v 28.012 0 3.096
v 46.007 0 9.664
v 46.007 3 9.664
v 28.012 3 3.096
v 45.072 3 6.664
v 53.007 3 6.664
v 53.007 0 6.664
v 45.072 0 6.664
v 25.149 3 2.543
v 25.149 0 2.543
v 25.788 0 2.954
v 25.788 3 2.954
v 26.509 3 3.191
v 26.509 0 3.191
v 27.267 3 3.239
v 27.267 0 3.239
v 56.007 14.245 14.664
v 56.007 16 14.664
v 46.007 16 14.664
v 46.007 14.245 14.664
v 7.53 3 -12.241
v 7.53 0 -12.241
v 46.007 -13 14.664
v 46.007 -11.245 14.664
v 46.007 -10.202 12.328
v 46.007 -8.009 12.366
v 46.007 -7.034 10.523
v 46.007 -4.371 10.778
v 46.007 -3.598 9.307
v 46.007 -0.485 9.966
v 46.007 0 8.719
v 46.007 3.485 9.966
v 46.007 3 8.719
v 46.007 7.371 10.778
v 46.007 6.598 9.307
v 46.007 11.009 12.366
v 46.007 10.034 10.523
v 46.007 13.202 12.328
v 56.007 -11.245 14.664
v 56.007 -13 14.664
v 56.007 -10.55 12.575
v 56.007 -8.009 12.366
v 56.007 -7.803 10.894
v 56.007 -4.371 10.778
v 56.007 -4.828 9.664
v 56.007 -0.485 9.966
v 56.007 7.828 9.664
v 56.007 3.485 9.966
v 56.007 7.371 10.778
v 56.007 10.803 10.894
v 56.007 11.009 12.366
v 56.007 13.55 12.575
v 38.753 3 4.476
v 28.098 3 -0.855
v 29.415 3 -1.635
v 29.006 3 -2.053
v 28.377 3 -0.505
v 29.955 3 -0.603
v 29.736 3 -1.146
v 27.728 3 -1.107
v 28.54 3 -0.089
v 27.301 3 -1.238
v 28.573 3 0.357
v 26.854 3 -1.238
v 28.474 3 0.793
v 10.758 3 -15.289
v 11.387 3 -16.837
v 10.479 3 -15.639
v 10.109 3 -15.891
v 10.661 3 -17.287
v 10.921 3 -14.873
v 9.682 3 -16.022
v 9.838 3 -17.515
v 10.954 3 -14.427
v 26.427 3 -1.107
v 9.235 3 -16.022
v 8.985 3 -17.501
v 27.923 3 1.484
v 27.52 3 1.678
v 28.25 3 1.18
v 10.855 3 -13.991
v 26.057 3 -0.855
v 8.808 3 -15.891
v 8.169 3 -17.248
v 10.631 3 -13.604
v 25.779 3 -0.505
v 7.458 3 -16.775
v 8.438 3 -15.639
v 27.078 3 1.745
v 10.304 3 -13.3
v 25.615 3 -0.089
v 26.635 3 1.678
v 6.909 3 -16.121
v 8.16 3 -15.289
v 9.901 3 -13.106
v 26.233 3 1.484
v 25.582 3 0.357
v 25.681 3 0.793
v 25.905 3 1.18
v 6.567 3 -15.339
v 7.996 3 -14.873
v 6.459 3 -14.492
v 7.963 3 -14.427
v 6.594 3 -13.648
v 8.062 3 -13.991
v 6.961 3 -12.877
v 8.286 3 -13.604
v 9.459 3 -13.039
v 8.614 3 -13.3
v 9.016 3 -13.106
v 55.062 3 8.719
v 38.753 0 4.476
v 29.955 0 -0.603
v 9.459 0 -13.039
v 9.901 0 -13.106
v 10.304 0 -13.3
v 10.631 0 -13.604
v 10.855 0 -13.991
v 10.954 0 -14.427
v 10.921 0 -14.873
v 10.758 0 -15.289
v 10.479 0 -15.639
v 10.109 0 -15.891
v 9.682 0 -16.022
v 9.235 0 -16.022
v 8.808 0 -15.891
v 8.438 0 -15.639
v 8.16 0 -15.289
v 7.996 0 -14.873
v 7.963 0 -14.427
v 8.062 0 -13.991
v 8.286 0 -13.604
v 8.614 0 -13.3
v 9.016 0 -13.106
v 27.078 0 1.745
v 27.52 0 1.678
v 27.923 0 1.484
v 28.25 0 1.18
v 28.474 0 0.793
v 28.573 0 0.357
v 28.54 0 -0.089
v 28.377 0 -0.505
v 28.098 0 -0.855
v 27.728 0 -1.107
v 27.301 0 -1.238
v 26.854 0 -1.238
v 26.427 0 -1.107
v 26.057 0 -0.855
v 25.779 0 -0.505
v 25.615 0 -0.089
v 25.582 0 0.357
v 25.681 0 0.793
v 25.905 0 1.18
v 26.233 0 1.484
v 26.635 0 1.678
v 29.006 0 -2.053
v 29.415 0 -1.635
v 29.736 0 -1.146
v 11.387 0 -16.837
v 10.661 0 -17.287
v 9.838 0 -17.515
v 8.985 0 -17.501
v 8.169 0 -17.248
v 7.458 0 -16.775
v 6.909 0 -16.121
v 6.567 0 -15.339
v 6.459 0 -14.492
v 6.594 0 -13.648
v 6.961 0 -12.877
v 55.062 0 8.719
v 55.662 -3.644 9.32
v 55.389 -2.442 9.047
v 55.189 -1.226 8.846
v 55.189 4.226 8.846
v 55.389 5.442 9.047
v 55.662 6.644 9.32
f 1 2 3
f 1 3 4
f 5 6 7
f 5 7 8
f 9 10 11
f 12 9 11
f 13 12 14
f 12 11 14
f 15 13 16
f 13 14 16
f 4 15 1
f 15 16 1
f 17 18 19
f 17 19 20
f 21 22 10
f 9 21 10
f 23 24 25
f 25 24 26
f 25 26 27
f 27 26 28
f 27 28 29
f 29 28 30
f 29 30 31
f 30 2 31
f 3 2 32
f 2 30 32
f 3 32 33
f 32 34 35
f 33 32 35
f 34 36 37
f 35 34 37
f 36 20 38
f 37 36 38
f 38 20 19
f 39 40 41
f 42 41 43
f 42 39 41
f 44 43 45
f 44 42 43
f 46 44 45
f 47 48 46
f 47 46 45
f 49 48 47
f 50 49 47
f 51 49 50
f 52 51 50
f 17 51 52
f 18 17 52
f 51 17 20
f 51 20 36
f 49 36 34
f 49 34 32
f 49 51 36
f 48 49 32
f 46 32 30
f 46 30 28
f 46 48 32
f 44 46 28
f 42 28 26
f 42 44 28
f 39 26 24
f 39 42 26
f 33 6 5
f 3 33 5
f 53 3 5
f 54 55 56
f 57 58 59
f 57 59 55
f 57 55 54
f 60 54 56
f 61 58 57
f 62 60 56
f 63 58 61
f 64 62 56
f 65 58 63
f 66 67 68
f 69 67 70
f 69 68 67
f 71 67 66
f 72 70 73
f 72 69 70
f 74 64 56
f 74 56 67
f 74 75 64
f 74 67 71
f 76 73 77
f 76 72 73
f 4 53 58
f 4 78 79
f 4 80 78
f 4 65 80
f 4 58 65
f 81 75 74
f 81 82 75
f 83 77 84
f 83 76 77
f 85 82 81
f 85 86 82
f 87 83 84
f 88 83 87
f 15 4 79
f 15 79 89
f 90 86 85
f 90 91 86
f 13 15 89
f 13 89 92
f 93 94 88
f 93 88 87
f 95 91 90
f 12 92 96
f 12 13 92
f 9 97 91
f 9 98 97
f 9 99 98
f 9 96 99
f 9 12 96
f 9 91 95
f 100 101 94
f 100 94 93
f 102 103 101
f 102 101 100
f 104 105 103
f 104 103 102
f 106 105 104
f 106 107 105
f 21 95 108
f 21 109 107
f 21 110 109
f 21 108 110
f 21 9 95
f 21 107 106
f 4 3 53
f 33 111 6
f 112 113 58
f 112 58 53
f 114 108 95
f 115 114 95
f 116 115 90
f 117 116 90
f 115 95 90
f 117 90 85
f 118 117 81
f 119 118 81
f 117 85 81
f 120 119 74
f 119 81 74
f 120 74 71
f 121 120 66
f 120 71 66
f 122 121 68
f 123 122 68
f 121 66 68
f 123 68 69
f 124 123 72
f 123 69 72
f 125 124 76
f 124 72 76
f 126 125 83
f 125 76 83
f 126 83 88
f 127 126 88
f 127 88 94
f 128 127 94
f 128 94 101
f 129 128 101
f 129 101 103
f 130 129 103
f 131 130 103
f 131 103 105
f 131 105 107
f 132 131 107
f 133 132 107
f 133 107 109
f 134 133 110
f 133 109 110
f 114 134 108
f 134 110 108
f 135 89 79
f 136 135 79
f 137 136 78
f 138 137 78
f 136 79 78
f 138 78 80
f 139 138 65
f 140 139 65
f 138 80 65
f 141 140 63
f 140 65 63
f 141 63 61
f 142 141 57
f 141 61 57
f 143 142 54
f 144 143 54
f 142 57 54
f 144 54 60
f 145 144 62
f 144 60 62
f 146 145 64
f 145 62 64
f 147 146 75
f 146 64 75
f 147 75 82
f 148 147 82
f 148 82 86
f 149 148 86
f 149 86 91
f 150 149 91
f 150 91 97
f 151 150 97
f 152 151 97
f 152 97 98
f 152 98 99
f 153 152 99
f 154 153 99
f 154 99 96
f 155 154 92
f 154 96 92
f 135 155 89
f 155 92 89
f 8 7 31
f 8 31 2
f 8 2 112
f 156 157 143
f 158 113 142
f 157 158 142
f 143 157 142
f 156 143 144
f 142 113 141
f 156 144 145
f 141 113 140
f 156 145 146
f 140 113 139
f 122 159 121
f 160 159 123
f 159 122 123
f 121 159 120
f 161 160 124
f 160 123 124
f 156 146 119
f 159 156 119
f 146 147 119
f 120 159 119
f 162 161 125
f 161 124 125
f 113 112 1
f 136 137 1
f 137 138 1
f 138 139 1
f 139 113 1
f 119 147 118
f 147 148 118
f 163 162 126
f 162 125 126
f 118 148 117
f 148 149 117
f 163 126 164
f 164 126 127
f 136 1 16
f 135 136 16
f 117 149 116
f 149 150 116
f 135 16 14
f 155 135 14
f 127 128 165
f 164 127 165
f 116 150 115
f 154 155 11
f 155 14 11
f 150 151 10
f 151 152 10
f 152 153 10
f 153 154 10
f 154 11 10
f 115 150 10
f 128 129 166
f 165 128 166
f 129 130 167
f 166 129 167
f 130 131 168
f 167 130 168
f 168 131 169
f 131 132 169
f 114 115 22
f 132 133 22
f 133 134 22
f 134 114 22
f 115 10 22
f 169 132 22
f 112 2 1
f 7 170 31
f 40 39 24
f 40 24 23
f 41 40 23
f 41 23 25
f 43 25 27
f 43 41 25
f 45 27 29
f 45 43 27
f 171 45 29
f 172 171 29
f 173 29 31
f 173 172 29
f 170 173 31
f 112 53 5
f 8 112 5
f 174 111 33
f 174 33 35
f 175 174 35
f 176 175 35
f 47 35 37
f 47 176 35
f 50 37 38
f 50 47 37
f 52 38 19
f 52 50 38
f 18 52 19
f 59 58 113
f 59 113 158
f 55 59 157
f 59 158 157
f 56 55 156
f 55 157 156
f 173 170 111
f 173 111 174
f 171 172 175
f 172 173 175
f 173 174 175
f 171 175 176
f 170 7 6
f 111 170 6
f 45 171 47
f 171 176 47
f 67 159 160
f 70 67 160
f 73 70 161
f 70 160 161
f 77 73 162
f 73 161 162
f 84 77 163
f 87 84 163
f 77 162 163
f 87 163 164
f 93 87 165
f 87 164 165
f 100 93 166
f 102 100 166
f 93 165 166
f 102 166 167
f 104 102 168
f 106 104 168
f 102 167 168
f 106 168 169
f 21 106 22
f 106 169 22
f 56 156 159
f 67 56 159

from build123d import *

# Parameters (mm, degrees)
SKETCH_1_R          = 1.5
SKETCH_1_R_2        = 1.5000000000000007
EXTRUDE_1_DEPTH     = 3
EXTRUDE_2_DEPTH     = 3
EXTRUDE_3_DEPTH     = 10
EXTRUDE_4_DEPTH     = 3
SKETCH_5_W          = 5.158542288566252
SKETCH_5_H          = 3
EXTRUDE_5_DEPTH     = 2
SKETCH_6_W          = 7
SKETCH_6_H          = 3
EXTRUDE_6_DEPTH     = 2
CHAMFER_1_SIZE      = 3
SKETCH_7_W          = 66.6001387822102
SKETCH_7_H          = 28.97194366122671
CUT_EXTRUDE_1_DEPTH = 80
EXTRUDE_8_DEPTH     = 3
SKETCH_10_R         = 1.4999999999999987
SKETCH_10_R_2       = 1.5000000000000007
CUT_EXTRUDE_2_DEPTH = 3


with BuildPart() as part:
    # 草图1 → 凸台-拉伸1 (new body)
    with BuildSketch(Plane(origin=(0, 0, 0), x_dir=(1, 0, 0), z_dir=(0, 1, 0))):
        with BuildLine():
            Line((0, 2.999999999999999), (25, 2.999999999999999))
            ThreePointArc((25, 2.999999999999999), (28, 0), (25, -2.999999999999999))
            Line((25, -2.999999999999999), (0, -2.999999999999999))
            ThreePointArc((0, -2.999999999999999), (-2.999999999999997, 3.7e-16), (0, 2.999999999999999))
        make_face()
        with Locations(Location((0, 0, 0), (0, 0, 270))):
            Circle(SKETCH_1_R, mode=Mode.SUBTRACT)
        with Locations(Location((25, 0, 0), (0, 0, 270))):
            Circle(SKETCH_1_R_2, mode=Mode.SUBTRACT)
    extrude(amount=EXTRUDE_1_DEPTH)

    # 草图2 → 凸台-拉伸2 (add)
    with BuildSketch(Plane.XZ):
        with BuildLine():
            Line((26.499999999999986, -2.5980762113533244), (46.006930637676454, 8.664255443372392))
            Line((46.006930637676454, 8.664255443372392), (56.006930637676454, 8.664255443372392))
            Line((56.006930637676454, 8.664255443372392), (56.00693063767646, 9.66425544337239))
            Line((56.00693063767646, 9.66425544337239), (46.006930637676476, 9.66425544337241))
            Line((46.006930637676476, 9.66425544337241), (26.942439211337344, 2.7051474006582077))
            Line((26.942439211337344, 2.7051474006582077), (25.518180954342487, 2.9549092200195775))
            ThreePointArc((25.518180954342487, 2.9549092200195775), (27.954179309279922, 0.522326151578114), (26.499999999999986, -2.5980762113533244))
        make_face()
    extrude(amount=-EXTRUDE_2_DEPTH)

    # 草图3 → 凸台-拉伸3 (add)
    with BuildSketch(Plane(origin=(56.0069306376764, 0, -3.8863e-13), x_dir=(-6.94e-15, 0, -1), z_dir=(1, 0, -6.94e-15))):
        with BuildLine():
            Line((-14.664255443372781, 16), (-14.664255443372781, 14.245195173083879))
            ThreePointArc((-14.664255443372781, 14.245195173083879), (-9.864255443372706, 1.5000000000000009), (-14.664255443372777, -11.24519517308388))
            Line((-14.664255443372777, -11.24519517308388), (-14.664255443372777, -13))
            ThreePointArc((-14.664255443372777, -13), (-8.66425544337271, 1.5000000000000009), (-14.664255443372781, 16))
        make_face()
    extrude(amount=-EXTRUDE_3_DEPTH)

    # 草图4 → 凸台-拉伸4 (add)
    with BuildSketch(Plane(origin=(0, 3, 0), x_dir=(1, 0, 0), z_dir=(0, 1, 0))):
        Polygon((38.75296926264814, -4.476178890808707), (51.00693063767646, -8.719151204865875), (46.006930637676454, -8.664255443372392), align=None)
    extrude(amount=-EXTRUDE_4_DEPTH)

    # 草图5 → 凸台-拉伸5 (add)
    with BuildSketch(Plane(origin=(0, 0, 8.664255443372392), x_dir=(-1, 0, 0), z_dir=(0, 0, -1))):
        with Locations((-53.42765949339333, 1.5)):
            Rectangle(SKETCH_5_W, SKETCH_5_H)
    extrude(amount=EXTRUDE_5_DEPTH)

    # 草图6 → 凸台-拉伸6 (add)
    with BuildSketch(Plane(origin=(0, 0, 6.664255443372392), x_dir=(-1, 0, 0), z_dir=(0, 0, -1))):
        with Locations((-47.3483883491102, 1.5)):
            Rectangle(SKETCH_6_W, SKETCH_6_H)
    extrude(amount=-EXTRUDE_6_DEPTH)

    # 倒角1
    chamfer_1_edges = [part.edges().sort_by_distance(p)[0] for p in [
        (56.006930637676454, 1.5, 6.664255443372392),
    ]]
    chamfer(chamfer_1_edges, length=CHAMFER_1_SIZE)

    # 草图7 → 切除-拉伸1 (cut)
    with BuildSketch(Plane.XZ):
        with Locations((-6.222464944833996, 7.620791926380881)):
            Rectangle(SKETCH_7_W, SKETCH_7_H)
    extrude(amount=-CUT_EXTRUDE_1_DEPTH, mode=Mode.SUBTRACT)

    # 草图8 → 凸台-拉伸8 (add)
    with BuildSketch(Plane.XZ):
        with BuildLine():
            Line((29.005967275330715, -2.053188022146578), (11.386945083594192, -16.83730304493695))
            ThreePointArc((11.386945083594192, -16.83730304493695), (7.160448925177645, -16.46753254463963), (7.530219425474969, -12.241036386223078))
            Line((7.530219425474969, -12.241036386223078), (25.14924161721149, 2.5430786365672917))
            ThreePointArc((25.14924161721149, 2.5430786365672917), (29.37573777562804, 2.173308136269972), (29.005967275330715, -2.053188022146578))
        make_face()
    extrude(amount=-EXTRUDE_8_DEPTH)

    # 草图10 → 切除-拉伸2 (cut)
    with BuildSketch(Plane(origin=(0, 3, 0), x_dir=(1, 0, 0), z_dir=(0, 1, 0))):
        with Locations(Location((9.458582254534583, 14.539169715580016, 0), (0, 0, 270))):
            Circle(SKETCH_10_R)
        with Locations(Location((27.077604446271103, -0.24494530721035945, 0), (0, 0, 270))):
            Circle(SKETCH_10_R_2)
    extrude(amount=-CUT_EXTRUDE_2_DEPTH, mode=Mode.SUBTRACT)


solid = part.part
